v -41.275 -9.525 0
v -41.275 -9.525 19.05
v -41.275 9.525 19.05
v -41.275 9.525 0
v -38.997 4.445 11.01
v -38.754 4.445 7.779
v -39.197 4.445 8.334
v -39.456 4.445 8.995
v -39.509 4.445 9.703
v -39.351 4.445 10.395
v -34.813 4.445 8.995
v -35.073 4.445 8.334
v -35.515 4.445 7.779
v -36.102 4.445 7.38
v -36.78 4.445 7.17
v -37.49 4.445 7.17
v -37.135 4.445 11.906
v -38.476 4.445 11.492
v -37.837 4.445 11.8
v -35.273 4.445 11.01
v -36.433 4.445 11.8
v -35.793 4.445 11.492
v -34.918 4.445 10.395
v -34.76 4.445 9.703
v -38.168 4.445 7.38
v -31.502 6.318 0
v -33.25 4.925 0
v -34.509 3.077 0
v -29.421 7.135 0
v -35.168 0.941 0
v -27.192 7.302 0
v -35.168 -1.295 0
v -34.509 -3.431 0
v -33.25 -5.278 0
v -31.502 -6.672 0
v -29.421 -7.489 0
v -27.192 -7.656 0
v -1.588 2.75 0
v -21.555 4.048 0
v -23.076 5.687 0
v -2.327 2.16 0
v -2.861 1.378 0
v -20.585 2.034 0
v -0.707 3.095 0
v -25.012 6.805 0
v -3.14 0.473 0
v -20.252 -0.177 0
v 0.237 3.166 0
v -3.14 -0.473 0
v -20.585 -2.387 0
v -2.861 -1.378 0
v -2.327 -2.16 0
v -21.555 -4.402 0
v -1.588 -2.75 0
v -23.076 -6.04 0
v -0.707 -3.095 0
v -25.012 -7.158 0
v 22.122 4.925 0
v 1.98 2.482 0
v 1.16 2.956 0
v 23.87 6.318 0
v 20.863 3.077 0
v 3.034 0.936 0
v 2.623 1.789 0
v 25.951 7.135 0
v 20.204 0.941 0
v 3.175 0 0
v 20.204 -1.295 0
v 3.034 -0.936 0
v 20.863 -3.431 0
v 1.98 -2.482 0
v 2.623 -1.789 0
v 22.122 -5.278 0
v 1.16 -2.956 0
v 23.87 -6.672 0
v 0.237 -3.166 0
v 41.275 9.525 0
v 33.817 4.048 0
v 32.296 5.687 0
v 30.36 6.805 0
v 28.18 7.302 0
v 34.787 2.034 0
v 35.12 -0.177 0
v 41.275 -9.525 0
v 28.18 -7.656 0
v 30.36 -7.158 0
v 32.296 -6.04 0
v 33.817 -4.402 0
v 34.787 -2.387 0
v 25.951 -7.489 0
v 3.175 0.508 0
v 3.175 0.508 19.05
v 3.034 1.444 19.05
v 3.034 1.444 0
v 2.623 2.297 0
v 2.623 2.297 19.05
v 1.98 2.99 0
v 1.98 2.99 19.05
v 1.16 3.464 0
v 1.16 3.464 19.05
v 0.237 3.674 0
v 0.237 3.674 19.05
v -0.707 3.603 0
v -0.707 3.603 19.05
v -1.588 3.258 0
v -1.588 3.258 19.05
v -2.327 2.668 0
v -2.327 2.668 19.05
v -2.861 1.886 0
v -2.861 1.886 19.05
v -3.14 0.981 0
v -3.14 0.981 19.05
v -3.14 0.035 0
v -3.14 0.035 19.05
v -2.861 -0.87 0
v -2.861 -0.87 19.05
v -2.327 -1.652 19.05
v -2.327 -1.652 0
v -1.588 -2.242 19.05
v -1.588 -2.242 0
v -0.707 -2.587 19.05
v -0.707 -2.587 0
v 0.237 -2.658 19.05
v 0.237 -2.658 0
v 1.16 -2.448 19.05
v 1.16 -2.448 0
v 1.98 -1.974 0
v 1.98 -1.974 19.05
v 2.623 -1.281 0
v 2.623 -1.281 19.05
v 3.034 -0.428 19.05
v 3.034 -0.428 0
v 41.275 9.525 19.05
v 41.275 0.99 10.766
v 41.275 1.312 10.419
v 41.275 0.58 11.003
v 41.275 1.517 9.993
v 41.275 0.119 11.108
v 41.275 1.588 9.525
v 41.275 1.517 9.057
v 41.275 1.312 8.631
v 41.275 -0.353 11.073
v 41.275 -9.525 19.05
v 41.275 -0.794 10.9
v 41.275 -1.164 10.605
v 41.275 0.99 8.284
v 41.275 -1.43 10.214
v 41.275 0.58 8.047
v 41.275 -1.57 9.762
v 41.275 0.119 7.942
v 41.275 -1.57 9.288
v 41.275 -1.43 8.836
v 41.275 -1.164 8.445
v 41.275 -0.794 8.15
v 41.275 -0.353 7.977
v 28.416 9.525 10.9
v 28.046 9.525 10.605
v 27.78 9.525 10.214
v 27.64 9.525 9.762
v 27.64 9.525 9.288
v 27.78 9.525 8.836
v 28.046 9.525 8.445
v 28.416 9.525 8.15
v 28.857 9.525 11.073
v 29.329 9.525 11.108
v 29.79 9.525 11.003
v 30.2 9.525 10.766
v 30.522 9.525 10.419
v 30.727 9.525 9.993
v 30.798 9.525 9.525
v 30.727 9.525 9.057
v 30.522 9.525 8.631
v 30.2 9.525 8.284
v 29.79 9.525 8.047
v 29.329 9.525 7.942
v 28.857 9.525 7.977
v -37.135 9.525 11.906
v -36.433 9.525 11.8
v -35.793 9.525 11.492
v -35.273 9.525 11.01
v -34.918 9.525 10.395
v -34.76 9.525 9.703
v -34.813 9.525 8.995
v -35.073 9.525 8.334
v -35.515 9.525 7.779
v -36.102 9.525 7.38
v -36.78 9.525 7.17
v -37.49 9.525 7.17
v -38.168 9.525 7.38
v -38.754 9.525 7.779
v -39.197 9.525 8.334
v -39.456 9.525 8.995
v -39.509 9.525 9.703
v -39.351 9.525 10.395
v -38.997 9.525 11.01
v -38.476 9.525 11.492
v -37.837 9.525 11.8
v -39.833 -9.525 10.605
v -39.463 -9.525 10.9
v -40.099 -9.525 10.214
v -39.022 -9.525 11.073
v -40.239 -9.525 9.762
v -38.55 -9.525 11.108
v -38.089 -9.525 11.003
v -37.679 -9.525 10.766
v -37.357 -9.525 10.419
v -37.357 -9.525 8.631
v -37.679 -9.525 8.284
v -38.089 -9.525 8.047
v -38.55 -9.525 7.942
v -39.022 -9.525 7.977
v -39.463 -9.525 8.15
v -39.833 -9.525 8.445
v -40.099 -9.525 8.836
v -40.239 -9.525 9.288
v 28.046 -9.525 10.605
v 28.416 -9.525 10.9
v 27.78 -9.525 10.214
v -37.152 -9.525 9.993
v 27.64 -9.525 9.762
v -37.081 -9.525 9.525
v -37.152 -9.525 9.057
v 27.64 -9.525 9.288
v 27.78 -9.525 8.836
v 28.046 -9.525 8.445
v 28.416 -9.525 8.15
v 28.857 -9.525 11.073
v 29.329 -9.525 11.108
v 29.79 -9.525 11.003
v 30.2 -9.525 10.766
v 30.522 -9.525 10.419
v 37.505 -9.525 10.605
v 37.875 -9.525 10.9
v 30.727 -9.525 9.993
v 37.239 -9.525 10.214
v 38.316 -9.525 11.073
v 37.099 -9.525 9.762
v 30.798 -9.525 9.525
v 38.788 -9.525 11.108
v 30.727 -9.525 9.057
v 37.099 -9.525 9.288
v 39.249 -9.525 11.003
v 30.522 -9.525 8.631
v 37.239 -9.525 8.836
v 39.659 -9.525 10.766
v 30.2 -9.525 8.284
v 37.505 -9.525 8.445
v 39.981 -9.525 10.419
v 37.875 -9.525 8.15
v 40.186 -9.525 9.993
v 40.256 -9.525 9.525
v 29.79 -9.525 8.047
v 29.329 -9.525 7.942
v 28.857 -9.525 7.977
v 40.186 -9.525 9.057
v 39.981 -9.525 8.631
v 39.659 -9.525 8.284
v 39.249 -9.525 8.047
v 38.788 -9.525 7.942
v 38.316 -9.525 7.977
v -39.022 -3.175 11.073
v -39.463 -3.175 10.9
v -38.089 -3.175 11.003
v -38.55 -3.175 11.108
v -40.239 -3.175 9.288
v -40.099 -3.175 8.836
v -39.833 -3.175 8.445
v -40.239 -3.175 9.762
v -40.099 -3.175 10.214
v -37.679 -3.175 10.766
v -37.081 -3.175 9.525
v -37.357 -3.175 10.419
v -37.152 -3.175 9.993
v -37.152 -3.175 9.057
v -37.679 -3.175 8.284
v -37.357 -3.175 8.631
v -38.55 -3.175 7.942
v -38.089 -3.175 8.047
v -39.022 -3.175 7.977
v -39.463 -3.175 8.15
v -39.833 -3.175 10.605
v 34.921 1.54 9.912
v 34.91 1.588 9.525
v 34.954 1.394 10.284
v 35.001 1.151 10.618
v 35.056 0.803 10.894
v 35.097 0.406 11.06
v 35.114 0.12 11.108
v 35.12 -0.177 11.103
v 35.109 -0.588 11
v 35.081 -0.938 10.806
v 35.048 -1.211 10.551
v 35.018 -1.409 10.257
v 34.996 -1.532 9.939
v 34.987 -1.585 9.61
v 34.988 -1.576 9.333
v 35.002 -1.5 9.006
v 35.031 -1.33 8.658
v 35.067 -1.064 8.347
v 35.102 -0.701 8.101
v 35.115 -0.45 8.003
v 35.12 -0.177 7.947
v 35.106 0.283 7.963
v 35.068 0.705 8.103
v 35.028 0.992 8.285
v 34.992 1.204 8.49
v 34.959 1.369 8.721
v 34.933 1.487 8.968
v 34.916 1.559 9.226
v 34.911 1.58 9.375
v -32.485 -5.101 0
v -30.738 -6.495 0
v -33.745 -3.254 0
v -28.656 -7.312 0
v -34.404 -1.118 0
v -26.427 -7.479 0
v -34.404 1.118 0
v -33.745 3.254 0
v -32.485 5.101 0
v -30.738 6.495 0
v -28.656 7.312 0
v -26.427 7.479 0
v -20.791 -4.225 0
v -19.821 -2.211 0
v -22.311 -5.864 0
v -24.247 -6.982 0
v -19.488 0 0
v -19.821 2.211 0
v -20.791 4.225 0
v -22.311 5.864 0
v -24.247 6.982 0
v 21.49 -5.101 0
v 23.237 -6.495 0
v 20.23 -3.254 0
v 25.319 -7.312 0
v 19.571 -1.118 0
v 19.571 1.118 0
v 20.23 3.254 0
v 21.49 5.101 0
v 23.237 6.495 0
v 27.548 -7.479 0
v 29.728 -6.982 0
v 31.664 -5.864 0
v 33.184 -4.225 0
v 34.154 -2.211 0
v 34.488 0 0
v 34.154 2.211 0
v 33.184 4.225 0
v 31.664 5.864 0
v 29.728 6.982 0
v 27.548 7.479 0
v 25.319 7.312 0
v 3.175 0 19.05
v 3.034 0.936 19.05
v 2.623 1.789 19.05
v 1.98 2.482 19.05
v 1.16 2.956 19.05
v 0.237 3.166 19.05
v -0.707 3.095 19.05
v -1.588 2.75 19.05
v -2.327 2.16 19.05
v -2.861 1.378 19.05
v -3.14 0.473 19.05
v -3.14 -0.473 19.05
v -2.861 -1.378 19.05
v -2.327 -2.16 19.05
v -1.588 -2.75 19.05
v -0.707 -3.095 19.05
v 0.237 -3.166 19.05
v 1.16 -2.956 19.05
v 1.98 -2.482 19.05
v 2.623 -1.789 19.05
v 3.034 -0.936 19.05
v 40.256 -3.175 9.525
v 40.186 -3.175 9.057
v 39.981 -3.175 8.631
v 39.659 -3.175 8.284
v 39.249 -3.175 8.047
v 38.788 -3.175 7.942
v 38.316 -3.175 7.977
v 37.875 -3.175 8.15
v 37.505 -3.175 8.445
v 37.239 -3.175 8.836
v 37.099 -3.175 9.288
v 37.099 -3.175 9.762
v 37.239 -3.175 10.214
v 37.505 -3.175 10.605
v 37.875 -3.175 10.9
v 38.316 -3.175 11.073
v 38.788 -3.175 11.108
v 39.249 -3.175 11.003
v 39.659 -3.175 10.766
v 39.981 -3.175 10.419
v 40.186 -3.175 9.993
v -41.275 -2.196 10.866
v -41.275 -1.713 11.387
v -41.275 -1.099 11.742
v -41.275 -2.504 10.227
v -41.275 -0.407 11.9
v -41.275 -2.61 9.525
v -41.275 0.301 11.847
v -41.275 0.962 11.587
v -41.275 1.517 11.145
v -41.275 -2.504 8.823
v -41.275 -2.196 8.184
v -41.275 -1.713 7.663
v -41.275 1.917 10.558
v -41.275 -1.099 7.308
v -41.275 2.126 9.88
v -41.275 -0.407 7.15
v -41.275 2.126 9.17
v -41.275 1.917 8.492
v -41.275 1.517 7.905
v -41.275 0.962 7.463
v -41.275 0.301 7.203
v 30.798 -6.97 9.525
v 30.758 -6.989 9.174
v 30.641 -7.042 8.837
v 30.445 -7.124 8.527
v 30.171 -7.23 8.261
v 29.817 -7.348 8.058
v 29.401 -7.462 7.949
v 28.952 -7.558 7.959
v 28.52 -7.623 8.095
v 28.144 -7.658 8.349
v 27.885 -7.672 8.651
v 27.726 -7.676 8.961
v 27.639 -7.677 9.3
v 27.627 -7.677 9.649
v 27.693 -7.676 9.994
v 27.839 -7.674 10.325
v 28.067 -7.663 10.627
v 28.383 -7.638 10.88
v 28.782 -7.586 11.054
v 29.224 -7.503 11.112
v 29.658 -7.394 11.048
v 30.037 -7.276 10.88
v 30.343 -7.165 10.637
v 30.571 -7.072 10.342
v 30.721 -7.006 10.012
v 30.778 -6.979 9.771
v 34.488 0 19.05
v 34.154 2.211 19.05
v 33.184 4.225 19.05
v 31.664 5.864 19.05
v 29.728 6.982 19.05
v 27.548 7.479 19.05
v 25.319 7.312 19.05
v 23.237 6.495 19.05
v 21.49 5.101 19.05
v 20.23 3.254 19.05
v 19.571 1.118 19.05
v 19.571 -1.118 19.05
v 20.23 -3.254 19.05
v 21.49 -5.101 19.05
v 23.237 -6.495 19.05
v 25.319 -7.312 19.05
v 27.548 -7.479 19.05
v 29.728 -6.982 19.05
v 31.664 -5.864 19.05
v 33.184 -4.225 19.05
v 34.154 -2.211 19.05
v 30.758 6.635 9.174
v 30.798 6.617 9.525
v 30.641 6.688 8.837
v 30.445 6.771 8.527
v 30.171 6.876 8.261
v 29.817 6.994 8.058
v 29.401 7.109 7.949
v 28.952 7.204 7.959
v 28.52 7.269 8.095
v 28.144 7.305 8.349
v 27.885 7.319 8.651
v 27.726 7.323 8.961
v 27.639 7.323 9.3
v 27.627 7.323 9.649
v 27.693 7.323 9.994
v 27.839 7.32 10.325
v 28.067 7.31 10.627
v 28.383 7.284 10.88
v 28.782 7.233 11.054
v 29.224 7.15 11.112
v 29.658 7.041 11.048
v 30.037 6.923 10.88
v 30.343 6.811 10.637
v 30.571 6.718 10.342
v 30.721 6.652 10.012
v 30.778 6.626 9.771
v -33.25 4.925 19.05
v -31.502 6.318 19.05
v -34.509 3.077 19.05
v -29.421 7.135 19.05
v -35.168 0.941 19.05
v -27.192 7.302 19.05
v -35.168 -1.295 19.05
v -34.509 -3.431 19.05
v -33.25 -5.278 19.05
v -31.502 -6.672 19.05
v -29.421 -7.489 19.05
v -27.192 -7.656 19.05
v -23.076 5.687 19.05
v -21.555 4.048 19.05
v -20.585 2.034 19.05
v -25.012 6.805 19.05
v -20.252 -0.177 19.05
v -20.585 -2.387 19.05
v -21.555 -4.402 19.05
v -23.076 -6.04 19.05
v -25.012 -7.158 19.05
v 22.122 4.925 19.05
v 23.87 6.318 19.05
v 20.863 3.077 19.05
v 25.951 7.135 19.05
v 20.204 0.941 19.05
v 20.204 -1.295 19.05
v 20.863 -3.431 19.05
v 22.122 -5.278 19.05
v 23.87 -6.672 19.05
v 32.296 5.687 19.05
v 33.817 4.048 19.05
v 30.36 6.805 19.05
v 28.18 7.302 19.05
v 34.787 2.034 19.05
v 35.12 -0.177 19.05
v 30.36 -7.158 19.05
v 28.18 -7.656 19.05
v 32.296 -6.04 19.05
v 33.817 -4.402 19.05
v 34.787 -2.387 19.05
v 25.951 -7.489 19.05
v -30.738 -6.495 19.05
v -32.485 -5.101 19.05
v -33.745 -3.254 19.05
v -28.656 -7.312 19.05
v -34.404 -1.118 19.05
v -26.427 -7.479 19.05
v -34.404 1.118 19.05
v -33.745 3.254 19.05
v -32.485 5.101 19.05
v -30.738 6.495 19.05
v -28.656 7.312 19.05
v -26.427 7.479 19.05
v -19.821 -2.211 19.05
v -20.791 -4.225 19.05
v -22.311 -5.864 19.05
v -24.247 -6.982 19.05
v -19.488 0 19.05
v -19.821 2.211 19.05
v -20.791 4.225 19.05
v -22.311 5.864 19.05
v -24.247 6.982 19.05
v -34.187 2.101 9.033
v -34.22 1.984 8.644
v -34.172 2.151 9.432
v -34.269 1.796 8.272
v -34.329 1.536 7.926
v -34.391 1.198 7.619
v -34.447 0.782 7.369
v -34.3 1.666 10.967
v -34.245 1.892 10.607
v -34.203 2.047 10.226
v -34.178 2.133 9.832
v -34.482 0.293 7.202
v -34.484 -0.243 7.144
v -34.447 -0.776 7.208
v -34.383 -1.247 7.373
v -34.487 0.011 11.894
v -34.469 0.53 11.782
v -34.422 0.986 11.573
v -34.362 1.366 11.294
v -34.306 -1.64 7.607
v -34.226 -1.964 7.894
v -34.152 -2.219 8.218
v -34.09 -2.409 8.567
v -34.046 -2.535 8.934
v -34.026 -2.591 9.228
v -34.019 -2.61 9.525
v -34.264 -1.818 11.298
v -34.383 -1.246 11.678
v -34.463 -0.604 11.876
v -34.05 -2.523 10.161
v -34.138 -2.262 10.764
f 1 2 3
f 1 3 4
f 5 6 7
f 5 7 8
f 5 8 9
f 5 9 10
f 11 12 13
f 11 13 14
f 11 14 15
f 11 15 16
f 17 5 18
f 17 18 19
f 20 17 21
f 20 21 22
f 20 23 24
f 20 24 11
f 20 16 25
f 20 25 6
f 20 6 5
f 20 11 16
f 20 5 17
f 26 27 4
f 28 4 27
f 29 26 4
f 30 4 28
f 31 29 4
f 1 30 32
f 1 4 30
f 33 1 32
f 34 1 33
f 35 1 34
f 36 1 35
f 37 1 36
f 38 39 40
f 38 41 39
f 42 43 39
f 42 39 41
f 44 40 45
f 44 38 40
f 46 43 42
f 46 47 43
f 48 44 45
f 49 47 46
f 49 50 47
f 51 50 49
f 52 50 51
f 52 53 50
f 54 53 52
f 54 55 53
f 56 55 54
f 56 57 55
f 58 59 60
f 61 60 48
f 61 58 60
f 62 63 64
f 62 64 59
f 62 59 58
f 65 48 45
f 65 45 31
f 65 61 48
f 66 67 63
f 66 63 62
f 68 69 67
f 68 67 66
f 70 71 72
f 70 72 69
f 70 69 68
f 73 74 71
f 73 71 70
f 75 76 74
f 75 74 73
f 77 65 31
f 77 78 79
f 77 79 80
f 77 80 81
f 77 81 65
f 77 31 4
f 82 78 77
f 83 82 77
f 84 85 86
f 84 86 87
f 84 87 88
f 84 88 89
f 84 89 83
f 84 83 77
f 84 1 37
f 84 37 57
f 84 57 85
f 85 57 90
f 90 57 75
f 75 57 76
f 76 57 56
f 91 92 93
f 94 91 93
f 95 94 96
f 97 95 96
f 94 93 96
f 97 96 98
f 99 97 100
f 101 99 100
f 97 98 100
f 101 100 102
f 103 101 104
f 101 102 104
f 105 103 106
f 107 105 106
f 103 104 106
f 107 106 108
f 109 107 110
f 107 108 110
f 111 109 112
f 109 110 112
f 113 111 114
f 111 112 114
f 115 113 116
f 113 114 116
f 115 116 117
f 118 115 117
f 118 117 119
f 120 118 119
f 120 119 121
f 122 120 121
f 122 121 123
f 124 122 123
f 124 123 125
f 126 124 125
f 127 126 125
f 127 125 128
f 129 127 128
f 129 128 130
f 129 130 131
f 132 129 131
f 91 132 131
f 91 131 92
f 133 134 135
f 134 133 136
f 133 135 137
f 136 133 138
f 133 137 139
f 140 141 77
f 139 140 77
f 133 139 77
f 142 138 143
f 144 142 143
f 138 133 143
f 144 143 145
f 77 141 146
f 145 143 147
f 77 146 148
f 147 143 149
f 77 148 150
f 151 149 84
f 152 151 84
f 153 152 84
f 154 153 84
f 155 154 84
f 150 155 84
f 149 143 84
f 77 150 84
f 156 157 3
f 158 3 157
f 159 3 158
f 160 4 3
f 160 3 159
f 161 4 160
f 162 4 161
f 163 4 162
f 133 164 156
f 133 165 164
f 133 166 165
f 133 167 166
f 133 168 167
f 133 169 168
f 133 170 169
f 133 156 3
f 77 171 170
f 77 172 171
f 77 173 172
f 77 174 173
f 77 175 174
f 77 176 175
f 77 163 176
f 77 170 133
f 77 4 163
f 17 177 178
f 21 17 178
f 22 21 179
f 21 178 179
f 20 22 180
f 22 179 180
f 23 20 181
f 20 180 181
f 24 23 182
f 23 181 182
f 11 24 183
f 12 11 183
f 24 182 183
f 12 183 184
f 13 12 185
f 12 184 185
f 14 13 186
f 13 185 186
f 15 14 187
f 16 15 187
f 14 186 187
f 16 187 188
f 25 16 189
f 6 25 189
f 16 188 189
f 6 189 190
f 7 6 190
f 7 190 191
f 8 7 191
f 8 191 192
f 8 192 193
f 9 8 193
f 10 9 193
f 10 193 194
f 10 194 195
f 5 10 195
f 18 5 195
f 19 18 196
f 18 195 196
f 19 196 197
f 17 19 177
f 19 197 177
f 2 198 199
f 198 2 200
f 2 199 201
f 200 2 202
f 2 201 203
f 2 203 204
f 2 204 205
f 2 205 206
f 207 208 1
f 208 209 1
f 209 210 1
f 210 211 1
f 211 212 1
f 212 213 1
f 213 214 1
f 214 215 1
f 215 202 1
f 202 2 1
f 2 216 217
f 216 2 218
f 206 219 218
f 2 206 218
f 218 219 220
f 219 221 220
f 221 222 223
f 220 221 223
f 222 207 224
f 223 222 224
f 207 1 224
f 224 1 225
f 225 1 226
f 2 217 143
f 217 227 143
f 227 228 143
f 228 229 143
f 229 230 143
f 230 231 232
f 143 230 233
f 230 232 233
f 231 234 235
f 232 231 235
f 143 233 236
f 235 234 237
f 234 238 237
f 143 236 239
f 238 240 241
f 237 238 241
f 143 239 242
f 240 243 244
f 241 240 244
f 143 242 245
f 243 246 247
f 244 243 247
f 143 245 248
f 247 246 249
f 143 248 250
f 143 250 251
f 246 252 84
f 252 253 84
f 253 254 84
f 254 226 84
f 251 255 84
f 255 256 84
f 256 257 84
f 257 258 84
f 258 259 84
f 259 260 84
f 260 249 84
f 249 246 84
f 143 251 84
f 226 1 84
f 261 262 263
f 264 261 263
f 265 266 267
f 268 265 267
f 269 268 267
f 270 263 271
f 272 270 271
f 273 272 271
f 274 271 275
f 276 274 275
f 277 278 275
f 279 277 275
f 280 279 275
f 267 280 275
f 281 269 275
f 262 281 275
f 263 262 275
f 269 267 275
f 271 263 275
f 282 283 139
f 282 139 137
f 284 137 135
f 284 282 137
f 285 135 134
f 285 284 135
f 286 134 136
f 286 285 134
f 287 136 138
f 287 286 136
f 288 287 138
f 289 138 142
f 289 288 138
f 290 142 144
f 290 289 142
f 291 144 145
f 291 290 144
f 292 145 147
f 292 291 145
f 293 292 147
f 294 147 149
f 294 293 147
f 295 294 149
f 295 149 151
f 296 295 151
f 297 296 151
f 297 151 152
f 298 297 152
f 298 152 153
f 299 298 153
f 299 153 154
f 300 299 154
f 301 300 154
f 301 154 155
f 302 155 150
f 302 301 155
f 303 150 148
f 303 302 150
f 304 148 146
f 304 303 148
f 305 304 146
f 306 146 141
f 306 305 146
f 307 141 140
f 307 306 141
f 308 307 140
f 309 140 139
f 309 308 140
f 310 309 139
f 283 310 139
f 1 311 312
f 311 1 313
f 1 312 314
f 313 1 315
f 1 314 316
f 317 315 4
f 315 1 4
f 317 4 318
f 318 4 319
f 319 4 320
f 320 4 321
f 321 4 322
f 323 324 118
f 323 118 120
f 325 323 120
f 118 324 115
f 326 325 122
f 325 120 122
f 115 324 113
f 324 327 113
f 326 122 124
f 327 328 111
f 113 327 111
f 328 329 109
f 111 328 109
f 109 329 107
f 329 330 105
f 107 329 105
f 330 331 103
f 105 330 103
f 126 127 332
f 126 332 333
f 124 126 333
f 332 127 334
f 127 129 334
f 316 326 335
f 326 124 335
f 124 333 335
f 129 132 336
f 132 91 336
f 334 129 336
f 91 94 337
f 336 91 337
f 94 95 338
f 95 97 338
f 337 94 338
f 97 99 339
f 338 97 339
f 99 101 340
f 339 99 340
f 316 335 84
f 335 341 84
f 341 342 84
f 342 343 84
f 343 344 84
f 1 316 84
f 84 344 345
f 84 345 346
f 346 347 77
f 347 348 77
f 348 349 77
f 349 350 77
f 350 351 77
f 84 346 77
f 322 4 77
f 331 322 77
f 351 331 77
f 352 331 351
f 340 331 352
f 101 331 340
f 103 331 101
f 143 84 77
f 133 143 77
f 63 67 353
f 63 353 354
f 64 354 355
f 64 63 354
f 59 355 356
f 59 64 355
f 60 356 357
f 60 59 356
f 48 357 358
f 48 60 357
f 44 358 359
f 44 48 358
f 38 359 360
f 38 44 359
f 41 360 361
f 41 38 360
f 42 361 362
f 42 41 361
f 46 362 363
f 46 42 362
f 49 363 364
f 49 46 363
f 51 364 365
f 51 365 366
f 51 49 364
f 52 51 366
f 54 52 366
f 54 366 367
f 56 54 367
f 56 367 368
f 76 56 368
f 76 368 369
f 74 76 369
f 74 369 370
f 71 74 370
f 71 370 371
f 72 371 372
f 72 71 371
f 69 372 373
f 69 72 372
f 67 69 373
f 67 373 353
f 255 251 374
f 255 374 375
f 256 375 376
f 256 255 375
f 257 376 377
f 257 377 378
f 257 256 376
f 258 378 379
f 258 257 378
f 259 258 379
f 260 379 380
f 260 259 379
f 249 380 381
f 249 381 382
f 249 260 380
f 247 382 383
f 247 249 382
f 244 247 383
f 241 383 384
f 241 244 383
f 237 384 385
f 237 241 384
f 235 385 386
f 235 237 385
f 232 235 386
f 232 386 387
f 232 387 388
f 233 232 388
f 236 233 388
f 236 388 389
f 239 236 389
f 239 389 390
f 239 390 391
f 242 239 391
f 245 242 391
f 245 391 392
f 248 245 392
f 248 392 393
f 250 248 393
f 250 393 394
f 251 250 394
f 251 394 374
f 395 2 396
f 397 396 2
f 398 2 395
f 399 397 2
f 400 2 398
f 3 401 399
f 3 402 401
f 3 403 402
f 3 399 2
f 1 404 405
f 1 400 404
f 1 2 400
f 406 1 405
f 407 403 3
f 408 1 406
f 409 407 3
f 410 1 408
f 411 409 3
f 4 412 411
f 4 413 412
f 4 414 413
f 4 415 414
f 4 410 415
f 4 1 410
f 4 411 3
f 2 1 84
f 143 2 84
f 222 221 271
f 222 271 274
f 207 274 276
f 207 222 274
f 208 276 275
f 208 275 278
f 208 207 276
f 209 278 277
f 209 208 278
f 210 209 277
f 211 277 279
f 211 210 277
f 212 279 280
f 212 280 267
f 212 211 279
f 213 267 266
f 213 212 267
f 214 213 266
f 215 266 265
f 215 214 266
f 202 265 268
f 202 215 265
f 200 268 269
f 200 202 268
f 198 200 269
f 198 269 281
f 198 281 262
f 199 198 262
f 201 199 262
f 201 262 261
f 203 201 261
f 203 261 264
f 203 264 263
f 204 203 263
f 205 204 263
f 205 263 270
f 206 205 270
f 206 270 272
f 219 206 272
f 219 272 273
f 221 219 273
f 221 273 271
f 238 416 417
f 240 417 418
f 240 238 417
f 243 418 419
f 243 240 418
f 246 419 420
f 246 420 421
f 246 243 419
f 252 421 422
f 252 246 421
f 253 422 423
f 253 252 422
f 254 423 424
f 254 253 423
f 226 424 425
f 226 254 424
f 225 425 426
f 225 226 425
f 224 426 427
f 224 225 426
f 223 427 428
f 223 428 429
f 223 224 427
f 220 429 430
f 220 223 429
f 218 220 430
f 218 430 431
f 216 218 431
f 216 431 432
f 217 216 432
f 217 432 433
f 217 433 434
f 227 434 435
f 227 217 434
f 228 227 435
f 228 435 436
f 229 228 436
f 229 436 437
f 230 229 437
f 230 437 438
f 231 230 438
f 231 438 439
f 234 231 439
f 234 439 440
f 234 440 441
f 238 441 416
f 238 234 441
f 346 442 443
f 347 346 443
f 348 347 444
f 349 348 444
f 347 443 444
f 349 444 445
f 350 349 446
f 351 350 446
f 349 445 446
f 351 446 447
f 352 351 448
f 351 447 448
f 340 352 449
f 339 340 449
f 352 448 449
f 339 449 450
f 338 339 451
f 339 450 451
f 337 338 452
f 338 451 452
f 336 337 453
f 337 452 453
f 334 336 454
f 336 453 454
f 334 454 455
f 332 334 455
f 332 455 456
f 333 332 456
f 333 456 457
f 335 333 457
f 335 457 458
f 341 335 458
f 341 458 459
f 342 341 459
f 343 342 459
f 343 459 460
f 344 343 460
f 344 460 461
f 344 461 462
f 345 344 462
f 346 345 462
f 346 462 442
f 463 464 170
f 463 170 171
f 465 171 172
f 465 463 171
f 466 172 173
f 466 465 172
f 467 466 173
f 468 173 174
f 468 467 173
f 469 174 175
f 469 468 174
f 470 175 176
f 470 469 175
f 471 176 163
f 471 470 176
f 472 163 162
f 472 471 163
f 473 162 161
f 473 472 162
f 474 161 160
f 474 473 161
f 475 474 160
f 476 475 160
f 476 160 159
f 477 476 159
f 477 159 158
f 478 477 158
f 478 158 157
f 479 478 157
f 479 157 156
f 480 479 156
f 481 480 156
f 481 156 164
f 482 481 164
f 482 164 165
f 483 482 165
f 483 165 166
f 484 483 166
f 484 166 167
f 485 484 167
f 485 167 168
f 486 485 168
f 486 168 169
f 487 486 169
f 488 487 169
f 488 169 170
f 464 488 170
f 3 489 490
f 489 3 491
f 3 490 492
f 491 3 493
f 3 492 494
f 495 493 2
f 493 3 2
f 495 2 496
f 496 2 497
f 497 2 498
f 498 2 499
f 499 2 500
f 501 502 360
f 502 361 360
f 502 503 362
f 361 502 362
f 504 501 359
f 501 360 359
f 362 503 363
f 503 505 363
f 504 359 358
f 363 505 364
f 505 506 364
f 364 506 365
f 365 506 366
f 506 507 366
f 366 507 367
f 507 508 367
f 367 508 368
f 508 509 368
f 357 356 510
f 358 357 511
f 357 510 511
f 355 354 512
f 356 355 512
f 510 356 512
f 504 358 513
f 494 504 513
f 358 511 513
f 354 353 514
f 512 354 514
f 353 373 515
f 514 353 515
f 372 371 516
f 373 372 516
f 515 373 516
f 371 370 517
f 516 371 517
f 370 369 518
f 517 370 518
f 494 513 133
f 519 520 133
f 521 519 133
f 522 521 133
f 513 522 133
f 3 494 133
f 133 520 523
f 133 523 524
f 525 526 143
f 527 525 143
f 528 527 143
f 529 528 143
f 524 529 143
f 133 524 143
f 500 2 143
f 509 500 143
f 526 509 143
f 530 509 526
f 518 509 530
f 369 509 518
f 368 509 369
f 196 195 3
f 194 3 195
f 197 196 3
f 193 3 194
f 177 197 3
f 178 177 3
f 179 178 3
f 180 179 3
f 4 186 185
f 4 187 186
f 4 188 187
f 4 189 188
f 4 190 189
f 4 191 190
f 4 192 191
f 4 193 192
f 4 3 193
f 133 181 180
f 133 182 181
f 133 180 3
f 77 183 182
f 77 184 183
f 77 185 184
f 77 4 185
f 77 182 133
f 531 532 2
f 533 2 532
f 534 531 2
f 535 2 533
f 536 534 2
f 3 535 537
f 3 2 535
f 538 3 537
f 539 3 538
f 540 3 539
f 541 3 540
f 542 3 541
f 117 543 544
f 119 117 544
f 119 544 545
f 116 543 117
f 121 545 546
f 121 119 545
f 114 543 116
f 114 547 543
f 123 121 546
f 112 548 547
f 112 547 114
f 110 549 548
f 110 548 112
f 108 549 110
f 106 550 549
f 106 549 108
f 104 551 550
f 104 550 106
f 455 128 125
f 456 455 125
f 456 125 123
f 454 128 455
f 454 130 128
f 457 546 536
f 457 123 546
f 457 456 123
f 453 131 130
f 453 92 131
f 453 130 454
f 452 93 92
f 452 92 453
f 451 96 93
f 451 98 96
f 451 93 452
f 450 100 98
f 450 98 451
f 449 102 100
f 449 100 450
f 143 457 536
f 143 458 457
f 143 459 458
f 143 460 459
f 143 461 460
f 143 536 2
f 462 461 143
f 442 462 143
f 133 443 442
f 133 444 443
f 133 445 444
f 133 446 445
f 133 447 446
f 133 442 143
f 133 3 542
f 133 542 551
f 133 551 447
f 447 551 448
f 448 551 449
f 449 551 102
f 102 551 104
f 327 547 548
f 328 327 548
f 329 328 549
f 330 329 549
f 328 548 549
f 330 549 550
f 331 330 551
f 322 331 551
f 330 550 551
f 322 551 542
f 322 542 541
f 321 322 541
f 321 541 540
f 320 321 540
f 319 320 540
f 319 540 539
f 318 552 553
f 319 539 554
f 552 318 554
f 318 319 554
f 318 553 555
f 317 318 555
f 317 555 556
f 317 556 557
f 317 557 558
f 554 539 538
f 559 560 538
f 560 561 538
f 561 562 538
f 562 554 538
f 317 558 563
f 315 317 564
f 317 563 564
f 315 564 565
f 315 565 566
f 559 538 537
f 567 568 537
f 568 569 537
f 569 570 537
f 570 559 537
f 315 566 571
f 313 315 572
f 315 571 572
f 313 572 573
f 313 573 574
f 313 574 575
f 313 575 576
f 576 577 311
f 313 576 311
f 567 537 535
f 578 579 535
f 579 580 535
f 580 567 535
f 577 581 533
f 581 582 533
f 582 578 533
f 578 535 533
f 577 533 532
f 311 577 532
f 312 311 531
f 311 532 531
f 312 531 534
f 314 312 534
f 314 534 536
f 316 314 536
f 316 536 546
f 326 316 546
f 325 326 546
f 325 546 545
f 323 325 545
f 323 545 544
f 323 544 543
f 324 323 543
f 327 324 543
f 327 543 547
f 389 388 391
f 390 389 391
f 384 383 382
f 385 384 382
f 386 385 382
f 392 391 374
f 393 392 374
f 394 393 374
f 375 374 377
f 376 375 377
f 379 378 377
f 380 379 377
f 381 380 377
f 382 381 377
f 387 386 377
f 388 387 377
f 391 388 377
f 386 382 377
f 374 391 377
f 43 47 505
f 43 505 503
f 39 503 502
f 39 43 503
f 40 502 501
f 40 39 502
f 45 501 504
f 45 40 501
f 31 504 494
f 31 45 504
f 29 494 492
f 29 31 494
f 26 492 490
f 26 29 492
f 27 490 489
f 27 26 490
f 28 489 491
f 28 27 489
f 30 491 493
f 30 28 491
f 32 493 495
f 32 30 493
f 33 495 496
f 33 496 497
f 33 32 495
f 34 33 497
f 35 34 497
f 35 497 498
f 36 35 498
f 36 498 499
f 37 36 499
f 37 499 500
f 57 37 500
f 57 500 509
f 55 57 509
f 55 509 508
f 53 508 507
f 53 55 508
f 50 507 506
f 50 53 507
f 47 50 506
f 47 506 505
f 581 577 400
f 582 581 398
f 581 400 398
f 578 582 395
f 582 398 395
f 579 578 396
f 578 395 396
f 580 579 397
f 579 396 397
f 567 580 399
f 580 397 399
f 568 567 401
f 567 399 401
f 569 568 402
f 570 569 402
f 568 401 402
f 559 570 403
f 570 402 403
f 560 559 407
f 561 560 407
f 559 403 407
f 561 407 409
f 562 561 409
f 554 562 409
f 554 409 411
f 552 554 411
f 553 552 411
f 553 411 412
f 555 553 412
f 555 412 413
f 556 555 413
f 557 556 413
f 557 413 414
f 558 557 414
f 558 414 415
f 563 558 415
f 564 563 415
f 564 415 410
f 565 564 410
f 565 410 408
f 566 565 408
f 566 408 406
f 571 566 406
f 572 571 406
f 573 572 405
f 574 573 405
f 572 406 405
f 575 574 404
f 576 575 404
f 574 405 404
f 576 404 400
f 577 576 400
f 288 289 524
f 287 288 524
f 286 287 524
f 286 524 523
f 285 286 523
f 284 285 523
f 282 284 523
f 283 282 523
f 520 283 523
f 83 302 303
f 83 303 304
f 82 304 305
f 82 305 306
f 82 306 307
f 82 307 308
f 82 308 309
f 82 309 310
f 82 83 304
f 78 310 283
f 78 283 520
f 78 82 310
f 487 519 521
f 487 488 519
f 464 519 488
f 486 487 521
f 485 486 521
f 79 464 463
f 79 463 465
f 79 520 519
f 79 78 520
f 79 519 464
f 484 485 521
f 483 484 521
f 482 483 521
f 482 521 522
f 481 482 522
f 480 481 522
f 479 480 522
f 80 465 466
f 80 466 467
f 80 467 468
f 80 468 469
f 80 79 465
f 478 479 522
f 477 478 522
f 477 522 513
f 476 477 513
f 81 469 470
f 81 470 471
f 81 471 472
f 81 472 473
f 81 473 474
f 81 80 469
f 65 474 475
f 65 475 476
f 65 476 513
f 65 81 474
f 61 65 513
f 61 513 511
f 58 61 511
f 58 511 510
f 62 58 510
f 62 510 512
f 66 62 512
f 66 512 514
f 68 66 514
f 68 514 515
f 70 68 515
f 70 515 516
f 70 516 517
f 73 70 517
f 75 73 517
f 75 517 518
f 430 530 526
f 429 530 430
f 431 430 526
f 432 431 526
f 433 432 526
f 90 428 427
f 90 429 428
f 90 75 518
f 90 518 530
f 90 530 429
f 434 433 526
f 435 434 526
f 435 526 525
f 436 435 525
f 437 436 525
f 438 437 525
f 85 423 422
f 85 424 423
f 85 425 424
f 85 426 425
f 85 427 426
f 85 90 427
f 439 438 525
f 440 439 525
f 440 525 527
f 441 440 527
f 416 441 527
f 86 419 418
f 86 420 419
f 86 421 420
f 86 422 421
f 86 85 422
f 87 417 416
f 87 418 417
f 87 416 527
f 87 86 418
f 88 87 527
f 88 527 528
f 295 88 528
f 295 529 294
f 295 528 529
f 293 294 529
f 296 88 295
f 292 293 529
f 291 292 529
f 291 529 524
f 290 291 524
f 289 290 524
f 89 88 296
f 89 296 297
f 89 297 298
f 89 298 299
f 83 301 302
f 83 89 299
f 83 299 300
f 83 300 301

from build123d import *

# Parameters (mm, degrees)
BOSS_EXTRUDE1_OUTLINE_W     = 82.55
BOSS_EXTRUDE1_OUTLINE_H     = 19.05
BOSS_EXTRUDE1_DEPTH         = 19.05
BOSS_EXTRUDE1_START         = -9.525
BOSS_EXTRUDE1_2_OUTLINE_W   = 82.55
BOSS_EXTRUDE1_2_OUTLINE_H   = 19.05
BOSS_EXTRUDE1_2_OUTLINE_R   = 1.5875
BOSS_EXTRUDE1_2_DEPTH       = 19.05
BOSS_EXTRUDE1_START_2       = -3.175
BOSS_EXTRUDE1_3_OUTLINE_R   = 1.5875
BOSS_EXTRUDE1_3_DEPTH       = 12.7
BOSS_EXTRUDE1_4_OUTLINE_R   = 3.175
BOSS_EXTRUDE1_4_OUTLINE_R_2 = 7.5
BOSS_EXTRUDE1_4_DEPTH       = 19.05
BOSS_EXTRUDE1_START_3       = 34
BOSS_EXTRUDE1_5_OUTLINE_R   = 1.5875
BOSS_EXTRUDE1_5_DEPTH       = 7.275
SKETCH2_R                   = 3.175
CUT_EXTRUDE1_DEPTH          = 47.446245962
SKETCH4_R                   = 7.5
CUT_EXTRUDE3_DEPTH          = 47.446245962
SKETCH29_R                  = 2.38125
CUT_EXTRUDE5_DEPTH          = 5.08
CUT_EXTRUDE7_REACH          = 87.253
CUT_EXTRUDE7_END_RADIUS     = 7.5
SKETCH51_R                  = 2.38125


with BuildPart() as part:
    # Boss-Extrude1: read off the stored shape, not the designer's step
    # Boss-Extrude1 outline → Boss-Extrude1 (new body)
    with BuildSketch(Plane.XY):
        Rectangle(BOSS_EXTRUDE1_OUTLINE_W, BOSS_EXTRUDE1_OUTLINE_H)
    extrude(amount=BOSS_EXTRUDE1_DEPTH)

    # Sketch2 → Cut-Extrude1 (cut, through all)
    with BuildSketch(Plane.XY.offset(19.05)):
        with Locations((0, 0.508)):
            Circle(SKETCH2_R)
    extrude(amount=-CUT_EXTRUDE1_DEPTH, mode=Mode.SUBTRACT)

    # Sketch4 → Cut-Extrude3 (cut, through all)
    with BuildSketch(Plane.XY.offset(19.05)):
        with Locations((-26.9875, 0)):
            Circle(SKETCH4_R)
        with Locations((26.9875, 0)):
            Circle(SKETCH4_R)
    extrude(amount=-CUT_EXTRUDE3_DEPTH, mode=Mode.SUBTRACT)

    # Sketch29 → Cut-Extrude5 (cut)
    with BuildSketch(Plane(origin=(0, 9.525, 0), x_dir=(1, 0, 0), z_dir=(0, 1, 0))):
        with Locations(Location((-37.1348, -9.525, 0), (0, 0, 270))):
            Circle(SKETCH29_R)
    extrude(amount=-CUT_EXTRUDE5_DEPTH, mode=Mode.SUBTRACT)

    # Cut-Extrude7: up to this cylinder (the profile starts outside it)
    cut_extrude7_end = Plane(origin=(-26.9875, 0, 9.525), z_dir=(0, 0, 1)) * Cylinder(CUT_EXTRUDE7_END_RADIUS, 190.506, mode=Mode.PRIVATE)
    # Sketch51 → Cut-Extrude7 (cut, up to the surface)
    with BuildSketch(Plane.ZY.offset(41.275), mode=Mode.PRIVATE) as cut_extrude7_sk1:
        with Locations(Location((9.525, -0.2286, 0), (0, 0, 270))):
            Circle(SKETCH51_R)
    cut_extrude7_tool1 = extrude(cut_extrude7_sk1.sketch, amount=-CUT_EXTRUDE7_REACH, mode=Mode.PRIVATE) - cut_extrude7_end
    add(cut_extrude7_tool1.solids().sort_by_distance((-41.275, -0.2286, 9.525))[0], mode=Mode.SUBTRACT)


with BuildPart() as body_2:
    # Boss-Extrude1 2 outline → Boss-Extrude1 2 (new body)
    with BuildSketch(Plane(origin=(0, 0, 0), x_dir=(1, 0, 0), z_dir=(0, 1, 0)).offset(BOSS_EXTRUDE1_START)):
        with Locations((0, -9.525)):
            Rectangle(BOSS_EXTRUDE1_2_OUTLINE_W, BOSS_EXTRUDE1_2_OUTLINE_H)
        with Locations((-38.66896, -9.525)):
            Circle(BOSS_EXTRUDE1_2_OUTLINE_R, mode=Mode.SUBTRACT)
        with Locations((29.21, -9.525)):
            Circle(BOSS_EXTRUDE1_2_OUTLINE_R, mode=Mode.SUBTRACT)
        with Locations((38.66896, -9.525)):
            Circle(BOSS_EXTRUDE1_2_OUTLINE_R, mode=Mode.SUBTRACT)
    extrude(amount=BOSS_EXTRUDE1_2_DEPTH)

    # Boss-Extrude1 3 outline → Boss-Extrude1 3 (add)
    with BuildSketch(Plane(origin=(0, 0, 0), x_dir=(1, 0, 0), z_dir=(0, 1, 0)).offset(BOSS_EXTRUDE1_START_2)):
        with Locations((38.66896, -9.525)):
            Circle(BOSS_EXTRUDE1_3_OUTLINE_R)
        with Locations((-38.66896, -9.525)):
            Circle(BOSS_EXTRUDE1_3_OUTLINE_R)
    extrude(amount=BOSS_EXTRUDE1_3_DEPTH)

    # Boss-Extrude1 4 outline → Boss-Extrude1 4 (cut)
    with BuildSketch(Plane.XY):
        Circle(BOSS_EXTRUDE1_4_OUTLINE_R)
        with Locations((27.619999315, -0.176721762)):
            Circle(BOSS_EXTRUDE1_4_OUTLINE_R_2)
        with Locations((-27.752000685, -0.176721762)):
            Circle(BOSS_EXTRUDE1_4_OUTLINE_R_2)
    extrude(amount=BOSS_EXTRUDE1_4_DEPTH, mode=Mode.SUBTRACT)

    # Boss-Extrude1 5 outline → Boss-Extrude1 5 (cut)
    with BuildSketch(Plane.YZ.offset(BOSS_EXTRUDE1_START_3)):
        with Locations((0, 9.525)):
            Circle(BOSS_EXTRUDE1_5_OUTLINE_R)
    extrude(amount=BOSS_EXTRUDE1_5_DEPTH, mode=Mode.SUBTRACT)


solid = Compound([part.part, body_2.part])
